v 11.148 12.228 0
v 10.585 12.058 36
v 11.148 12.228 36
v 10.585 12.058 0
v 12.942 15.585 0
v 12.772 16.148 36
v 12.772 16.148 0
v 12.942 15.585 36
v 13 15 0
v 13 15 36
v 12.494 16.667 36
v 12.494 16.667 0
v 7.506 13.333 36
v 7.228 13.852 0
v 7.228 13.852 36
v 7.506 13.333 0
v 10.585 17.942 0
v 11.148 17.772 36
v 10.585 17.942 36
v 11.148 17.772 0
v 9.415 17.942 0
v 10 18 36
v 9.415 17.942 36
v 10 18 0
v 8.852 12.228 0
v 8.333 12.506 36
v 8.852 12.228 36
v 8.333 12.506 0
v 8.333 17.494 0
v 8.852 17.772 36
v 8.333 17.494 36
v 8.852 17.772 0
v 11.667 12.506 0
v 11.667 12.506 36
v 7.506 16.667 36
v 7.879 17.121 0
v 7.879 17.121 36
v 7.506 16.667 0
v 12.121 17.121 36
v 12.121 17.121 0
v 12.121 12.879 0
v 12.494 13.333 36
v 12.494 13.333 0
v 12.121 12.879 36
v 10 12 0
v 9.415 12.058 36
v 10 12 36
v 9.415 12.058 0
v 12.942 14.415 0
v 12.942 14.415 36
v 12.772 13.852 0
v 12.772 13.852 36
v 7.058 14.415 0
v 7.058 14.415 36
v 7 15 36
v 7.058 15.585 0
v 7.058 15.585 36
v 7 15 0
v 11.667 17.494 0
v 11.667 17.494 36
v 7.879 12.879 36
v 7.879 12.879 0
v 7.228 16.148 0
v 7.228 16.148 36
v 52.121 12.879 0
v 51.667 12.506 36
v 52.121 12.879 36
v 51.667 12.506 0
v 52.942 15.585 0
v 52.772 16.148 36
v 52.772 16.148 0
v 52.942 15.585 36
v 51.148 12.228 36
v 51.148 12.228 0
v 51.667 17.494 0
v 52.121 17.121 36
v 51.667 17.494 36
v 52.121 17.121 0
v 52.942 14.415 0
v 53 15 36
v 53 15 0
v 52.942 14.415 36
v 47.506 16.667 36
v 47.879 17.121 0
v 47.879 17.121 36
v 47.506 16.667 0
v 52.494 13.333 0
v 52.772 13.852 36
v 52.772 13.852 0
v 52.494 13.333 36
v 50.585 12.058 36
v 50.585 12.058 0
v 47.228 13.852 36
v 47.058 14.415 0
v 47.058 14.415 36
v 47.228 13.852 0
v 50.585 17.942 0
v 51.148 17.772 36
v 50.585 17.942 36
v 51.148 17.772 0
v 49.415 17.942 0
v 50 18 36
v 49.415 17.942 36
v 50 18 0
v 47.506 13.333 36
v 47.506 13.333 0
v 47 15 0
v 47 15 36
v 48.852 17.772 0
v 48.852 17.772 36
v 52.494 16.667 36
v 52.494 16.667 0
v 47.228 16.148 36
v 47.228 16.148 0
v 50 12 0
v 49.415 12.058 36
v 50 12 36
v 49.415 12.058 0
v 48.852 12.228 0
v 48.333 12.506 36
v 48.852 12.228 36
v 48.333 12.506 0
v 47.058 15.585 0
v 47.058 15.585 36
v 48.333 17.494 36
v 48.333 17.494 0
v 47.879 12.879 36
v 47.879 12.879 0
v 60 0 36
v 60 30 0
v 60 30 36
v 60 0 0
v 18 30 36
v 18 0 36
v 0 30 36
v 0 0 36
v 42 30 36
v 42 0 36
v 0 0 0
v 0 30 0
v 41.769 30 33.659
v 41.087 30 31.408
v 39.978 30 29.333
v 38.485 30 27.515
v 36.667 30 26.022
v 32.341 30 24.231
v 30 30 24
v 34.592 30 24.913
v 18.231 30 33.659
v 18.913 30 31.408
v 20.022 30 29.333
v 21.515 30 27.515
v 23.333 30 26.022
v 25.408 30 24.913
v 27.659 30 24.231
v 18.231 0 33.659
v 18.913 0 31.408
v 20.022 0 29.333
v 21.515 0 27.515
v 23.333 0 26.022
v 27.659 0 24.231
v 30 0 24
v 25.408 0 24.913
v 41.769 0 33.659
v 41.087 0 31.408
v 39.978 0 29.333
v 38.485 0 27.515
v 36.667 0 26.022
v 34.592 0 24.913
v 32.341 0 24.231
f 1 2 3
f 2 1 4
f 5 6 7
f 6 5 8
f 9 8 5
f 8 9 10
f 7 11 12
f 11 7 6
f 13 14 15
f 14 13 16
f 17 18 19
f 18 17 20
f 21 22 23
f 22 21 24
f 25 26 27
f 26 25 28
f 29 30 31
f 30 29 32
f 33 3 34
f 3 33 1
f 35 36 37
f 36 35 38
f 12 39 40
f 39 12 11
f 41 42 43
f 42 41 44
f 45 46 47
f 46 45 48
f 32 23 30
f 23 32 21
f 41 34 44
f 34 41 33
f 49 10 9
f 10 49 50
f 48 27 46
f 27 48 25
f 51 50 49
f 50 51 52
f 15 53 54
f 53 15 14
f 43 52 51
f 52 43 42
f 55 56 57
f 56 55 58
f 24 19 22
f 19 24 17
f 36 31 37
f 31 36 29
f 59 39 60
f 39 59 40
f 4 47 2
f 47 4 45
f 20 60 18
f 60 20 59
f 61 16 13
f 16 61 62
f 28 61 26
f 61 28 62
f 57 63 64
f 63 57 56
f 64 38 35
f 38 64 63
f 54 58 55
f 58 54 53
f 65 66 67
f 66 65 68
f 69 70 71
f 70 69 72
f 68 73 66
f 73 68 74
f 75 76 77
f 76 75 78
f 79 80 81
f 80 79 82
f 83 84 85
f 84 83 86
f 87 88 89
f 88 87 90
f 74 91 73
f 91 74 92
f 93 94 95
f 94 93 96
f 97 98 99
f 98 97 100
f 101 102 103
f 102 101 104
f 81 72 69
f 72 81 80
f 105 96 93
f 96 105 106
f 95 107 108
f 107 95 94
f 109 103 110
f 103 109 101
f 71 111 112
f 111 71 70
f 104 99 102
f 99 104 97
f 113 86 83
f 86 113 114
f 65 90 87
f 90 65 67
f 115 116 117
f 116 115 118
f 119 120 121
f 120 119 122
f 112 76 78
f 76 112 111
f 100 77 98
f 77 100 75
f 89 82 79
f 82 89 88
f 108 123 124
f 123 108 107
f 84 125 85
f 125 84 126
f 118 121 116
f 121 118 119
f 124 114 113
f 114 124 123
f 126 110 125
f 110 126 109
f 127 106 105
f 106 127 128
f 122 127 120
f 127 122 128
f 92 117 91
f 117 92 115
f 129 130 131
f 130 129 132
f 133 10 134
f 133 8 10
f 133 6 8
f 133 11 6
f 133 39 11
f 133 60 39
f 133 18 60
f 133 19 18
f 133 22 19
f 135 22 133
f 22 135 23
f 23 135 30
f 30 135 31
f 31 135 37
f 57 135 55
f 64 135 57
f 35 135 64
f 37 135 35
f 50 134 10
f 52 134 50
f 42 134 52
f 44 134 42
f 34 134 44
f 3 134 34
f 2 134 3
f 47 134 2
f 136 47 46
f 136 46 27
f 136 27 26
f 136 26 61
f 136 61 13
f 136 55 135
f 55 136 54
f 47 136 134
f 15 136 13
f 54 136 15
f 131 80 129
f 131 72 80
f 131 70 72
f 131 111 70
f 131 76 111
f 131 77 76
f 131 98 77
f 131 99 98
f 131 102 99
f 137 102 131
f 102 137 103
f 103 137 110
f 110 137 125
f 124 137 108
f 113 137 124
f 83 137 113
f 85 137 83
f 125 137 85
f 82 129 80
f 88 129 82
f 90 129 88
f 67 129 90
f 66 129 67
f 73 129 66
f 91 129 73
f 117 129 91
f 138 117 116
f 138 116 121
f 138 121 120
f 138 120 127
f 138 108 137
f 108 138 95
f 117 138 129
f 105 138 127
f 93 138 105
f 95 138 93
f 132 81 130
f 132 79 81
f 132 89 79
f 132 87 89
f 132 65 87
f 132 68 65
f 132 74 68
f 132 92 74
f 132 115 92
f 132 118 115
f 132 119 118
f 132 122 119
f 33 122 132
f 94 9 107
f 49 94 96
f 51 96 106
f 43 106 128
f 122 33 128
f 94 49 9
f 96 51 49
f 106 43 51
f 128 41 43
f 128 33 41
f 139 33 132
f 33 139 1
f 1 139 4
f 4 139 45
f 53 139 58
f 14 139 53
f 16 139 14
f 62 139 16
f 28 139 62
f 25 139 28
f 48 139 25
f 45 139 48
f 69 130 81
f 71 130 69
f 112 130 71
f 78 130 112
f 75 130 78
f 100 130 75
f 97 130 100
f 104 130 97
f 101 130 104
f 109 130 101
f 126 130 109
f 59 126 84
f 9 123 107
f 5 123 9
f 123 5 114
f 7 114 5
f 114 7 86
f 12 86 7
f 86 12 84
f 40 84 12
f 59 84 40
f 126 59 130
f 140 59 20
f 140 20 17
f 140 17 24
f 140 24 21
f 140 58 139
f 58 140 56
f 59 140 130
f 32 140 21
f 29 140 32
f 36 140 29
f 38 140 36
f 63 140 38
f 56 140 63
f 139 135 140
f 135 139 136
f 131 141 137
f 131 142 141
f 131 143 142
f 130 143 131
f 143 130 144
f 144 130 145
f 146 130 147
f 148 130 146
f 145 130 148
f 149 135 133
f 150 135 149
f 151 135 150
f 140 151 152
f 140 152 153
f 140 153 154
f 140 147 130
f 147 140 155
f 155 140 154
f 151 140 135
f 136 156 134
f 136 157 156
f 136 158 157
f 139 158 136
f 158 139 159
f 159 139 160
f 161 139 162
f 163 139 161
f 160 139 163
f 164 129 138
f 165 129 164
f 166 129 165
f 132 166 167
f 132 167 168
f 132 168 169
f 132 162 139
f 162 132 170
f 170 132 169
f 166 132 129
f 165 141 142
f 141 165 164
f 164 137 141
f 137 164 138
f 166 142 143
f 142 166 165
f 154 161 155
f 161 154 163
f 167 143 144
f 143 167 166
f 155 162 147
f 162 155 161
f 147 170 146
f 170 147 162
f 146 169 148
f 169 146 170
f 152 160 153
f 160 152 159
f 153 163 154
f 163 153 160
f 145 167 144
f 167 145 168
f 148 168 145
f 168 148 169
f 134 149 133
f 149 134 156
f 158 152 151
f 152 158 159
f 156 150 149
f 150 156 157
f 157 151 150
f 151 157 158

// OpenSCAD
$fn = 32;

// ----------------------------------------------------------------------
// Saddle clamp: plain shaft clamp
// ----------------------------------------------------------------------

// --- parameters (mm) ---
blk_l = 60;               // block length, X
blk_w = 30;               // block width, Y
blk_h = 36;               // block height
clamp_r = 12;             // shaft groove radius
hole_r = 3;               // bolt hole radius
hole_m = 10;              // bolt hole margin from the ends

saw_depth = clamp_r + 3;  // saw kerf depth

difference() {
  cube([blk_l, blk_w, blk_h]);
  translate([blk_l / 2, -1, blk_h])
    rotate([-90, 0, 0])
      cylinder(h = blk_w + 2, r = clamp_r);
  for (sx = [0, 1])
    translate([sx ? blk_l - hole_m : hole_m, blk_w / 2, -1])
      cylinder(r = hole_r, h = blk_h + 2);
}
